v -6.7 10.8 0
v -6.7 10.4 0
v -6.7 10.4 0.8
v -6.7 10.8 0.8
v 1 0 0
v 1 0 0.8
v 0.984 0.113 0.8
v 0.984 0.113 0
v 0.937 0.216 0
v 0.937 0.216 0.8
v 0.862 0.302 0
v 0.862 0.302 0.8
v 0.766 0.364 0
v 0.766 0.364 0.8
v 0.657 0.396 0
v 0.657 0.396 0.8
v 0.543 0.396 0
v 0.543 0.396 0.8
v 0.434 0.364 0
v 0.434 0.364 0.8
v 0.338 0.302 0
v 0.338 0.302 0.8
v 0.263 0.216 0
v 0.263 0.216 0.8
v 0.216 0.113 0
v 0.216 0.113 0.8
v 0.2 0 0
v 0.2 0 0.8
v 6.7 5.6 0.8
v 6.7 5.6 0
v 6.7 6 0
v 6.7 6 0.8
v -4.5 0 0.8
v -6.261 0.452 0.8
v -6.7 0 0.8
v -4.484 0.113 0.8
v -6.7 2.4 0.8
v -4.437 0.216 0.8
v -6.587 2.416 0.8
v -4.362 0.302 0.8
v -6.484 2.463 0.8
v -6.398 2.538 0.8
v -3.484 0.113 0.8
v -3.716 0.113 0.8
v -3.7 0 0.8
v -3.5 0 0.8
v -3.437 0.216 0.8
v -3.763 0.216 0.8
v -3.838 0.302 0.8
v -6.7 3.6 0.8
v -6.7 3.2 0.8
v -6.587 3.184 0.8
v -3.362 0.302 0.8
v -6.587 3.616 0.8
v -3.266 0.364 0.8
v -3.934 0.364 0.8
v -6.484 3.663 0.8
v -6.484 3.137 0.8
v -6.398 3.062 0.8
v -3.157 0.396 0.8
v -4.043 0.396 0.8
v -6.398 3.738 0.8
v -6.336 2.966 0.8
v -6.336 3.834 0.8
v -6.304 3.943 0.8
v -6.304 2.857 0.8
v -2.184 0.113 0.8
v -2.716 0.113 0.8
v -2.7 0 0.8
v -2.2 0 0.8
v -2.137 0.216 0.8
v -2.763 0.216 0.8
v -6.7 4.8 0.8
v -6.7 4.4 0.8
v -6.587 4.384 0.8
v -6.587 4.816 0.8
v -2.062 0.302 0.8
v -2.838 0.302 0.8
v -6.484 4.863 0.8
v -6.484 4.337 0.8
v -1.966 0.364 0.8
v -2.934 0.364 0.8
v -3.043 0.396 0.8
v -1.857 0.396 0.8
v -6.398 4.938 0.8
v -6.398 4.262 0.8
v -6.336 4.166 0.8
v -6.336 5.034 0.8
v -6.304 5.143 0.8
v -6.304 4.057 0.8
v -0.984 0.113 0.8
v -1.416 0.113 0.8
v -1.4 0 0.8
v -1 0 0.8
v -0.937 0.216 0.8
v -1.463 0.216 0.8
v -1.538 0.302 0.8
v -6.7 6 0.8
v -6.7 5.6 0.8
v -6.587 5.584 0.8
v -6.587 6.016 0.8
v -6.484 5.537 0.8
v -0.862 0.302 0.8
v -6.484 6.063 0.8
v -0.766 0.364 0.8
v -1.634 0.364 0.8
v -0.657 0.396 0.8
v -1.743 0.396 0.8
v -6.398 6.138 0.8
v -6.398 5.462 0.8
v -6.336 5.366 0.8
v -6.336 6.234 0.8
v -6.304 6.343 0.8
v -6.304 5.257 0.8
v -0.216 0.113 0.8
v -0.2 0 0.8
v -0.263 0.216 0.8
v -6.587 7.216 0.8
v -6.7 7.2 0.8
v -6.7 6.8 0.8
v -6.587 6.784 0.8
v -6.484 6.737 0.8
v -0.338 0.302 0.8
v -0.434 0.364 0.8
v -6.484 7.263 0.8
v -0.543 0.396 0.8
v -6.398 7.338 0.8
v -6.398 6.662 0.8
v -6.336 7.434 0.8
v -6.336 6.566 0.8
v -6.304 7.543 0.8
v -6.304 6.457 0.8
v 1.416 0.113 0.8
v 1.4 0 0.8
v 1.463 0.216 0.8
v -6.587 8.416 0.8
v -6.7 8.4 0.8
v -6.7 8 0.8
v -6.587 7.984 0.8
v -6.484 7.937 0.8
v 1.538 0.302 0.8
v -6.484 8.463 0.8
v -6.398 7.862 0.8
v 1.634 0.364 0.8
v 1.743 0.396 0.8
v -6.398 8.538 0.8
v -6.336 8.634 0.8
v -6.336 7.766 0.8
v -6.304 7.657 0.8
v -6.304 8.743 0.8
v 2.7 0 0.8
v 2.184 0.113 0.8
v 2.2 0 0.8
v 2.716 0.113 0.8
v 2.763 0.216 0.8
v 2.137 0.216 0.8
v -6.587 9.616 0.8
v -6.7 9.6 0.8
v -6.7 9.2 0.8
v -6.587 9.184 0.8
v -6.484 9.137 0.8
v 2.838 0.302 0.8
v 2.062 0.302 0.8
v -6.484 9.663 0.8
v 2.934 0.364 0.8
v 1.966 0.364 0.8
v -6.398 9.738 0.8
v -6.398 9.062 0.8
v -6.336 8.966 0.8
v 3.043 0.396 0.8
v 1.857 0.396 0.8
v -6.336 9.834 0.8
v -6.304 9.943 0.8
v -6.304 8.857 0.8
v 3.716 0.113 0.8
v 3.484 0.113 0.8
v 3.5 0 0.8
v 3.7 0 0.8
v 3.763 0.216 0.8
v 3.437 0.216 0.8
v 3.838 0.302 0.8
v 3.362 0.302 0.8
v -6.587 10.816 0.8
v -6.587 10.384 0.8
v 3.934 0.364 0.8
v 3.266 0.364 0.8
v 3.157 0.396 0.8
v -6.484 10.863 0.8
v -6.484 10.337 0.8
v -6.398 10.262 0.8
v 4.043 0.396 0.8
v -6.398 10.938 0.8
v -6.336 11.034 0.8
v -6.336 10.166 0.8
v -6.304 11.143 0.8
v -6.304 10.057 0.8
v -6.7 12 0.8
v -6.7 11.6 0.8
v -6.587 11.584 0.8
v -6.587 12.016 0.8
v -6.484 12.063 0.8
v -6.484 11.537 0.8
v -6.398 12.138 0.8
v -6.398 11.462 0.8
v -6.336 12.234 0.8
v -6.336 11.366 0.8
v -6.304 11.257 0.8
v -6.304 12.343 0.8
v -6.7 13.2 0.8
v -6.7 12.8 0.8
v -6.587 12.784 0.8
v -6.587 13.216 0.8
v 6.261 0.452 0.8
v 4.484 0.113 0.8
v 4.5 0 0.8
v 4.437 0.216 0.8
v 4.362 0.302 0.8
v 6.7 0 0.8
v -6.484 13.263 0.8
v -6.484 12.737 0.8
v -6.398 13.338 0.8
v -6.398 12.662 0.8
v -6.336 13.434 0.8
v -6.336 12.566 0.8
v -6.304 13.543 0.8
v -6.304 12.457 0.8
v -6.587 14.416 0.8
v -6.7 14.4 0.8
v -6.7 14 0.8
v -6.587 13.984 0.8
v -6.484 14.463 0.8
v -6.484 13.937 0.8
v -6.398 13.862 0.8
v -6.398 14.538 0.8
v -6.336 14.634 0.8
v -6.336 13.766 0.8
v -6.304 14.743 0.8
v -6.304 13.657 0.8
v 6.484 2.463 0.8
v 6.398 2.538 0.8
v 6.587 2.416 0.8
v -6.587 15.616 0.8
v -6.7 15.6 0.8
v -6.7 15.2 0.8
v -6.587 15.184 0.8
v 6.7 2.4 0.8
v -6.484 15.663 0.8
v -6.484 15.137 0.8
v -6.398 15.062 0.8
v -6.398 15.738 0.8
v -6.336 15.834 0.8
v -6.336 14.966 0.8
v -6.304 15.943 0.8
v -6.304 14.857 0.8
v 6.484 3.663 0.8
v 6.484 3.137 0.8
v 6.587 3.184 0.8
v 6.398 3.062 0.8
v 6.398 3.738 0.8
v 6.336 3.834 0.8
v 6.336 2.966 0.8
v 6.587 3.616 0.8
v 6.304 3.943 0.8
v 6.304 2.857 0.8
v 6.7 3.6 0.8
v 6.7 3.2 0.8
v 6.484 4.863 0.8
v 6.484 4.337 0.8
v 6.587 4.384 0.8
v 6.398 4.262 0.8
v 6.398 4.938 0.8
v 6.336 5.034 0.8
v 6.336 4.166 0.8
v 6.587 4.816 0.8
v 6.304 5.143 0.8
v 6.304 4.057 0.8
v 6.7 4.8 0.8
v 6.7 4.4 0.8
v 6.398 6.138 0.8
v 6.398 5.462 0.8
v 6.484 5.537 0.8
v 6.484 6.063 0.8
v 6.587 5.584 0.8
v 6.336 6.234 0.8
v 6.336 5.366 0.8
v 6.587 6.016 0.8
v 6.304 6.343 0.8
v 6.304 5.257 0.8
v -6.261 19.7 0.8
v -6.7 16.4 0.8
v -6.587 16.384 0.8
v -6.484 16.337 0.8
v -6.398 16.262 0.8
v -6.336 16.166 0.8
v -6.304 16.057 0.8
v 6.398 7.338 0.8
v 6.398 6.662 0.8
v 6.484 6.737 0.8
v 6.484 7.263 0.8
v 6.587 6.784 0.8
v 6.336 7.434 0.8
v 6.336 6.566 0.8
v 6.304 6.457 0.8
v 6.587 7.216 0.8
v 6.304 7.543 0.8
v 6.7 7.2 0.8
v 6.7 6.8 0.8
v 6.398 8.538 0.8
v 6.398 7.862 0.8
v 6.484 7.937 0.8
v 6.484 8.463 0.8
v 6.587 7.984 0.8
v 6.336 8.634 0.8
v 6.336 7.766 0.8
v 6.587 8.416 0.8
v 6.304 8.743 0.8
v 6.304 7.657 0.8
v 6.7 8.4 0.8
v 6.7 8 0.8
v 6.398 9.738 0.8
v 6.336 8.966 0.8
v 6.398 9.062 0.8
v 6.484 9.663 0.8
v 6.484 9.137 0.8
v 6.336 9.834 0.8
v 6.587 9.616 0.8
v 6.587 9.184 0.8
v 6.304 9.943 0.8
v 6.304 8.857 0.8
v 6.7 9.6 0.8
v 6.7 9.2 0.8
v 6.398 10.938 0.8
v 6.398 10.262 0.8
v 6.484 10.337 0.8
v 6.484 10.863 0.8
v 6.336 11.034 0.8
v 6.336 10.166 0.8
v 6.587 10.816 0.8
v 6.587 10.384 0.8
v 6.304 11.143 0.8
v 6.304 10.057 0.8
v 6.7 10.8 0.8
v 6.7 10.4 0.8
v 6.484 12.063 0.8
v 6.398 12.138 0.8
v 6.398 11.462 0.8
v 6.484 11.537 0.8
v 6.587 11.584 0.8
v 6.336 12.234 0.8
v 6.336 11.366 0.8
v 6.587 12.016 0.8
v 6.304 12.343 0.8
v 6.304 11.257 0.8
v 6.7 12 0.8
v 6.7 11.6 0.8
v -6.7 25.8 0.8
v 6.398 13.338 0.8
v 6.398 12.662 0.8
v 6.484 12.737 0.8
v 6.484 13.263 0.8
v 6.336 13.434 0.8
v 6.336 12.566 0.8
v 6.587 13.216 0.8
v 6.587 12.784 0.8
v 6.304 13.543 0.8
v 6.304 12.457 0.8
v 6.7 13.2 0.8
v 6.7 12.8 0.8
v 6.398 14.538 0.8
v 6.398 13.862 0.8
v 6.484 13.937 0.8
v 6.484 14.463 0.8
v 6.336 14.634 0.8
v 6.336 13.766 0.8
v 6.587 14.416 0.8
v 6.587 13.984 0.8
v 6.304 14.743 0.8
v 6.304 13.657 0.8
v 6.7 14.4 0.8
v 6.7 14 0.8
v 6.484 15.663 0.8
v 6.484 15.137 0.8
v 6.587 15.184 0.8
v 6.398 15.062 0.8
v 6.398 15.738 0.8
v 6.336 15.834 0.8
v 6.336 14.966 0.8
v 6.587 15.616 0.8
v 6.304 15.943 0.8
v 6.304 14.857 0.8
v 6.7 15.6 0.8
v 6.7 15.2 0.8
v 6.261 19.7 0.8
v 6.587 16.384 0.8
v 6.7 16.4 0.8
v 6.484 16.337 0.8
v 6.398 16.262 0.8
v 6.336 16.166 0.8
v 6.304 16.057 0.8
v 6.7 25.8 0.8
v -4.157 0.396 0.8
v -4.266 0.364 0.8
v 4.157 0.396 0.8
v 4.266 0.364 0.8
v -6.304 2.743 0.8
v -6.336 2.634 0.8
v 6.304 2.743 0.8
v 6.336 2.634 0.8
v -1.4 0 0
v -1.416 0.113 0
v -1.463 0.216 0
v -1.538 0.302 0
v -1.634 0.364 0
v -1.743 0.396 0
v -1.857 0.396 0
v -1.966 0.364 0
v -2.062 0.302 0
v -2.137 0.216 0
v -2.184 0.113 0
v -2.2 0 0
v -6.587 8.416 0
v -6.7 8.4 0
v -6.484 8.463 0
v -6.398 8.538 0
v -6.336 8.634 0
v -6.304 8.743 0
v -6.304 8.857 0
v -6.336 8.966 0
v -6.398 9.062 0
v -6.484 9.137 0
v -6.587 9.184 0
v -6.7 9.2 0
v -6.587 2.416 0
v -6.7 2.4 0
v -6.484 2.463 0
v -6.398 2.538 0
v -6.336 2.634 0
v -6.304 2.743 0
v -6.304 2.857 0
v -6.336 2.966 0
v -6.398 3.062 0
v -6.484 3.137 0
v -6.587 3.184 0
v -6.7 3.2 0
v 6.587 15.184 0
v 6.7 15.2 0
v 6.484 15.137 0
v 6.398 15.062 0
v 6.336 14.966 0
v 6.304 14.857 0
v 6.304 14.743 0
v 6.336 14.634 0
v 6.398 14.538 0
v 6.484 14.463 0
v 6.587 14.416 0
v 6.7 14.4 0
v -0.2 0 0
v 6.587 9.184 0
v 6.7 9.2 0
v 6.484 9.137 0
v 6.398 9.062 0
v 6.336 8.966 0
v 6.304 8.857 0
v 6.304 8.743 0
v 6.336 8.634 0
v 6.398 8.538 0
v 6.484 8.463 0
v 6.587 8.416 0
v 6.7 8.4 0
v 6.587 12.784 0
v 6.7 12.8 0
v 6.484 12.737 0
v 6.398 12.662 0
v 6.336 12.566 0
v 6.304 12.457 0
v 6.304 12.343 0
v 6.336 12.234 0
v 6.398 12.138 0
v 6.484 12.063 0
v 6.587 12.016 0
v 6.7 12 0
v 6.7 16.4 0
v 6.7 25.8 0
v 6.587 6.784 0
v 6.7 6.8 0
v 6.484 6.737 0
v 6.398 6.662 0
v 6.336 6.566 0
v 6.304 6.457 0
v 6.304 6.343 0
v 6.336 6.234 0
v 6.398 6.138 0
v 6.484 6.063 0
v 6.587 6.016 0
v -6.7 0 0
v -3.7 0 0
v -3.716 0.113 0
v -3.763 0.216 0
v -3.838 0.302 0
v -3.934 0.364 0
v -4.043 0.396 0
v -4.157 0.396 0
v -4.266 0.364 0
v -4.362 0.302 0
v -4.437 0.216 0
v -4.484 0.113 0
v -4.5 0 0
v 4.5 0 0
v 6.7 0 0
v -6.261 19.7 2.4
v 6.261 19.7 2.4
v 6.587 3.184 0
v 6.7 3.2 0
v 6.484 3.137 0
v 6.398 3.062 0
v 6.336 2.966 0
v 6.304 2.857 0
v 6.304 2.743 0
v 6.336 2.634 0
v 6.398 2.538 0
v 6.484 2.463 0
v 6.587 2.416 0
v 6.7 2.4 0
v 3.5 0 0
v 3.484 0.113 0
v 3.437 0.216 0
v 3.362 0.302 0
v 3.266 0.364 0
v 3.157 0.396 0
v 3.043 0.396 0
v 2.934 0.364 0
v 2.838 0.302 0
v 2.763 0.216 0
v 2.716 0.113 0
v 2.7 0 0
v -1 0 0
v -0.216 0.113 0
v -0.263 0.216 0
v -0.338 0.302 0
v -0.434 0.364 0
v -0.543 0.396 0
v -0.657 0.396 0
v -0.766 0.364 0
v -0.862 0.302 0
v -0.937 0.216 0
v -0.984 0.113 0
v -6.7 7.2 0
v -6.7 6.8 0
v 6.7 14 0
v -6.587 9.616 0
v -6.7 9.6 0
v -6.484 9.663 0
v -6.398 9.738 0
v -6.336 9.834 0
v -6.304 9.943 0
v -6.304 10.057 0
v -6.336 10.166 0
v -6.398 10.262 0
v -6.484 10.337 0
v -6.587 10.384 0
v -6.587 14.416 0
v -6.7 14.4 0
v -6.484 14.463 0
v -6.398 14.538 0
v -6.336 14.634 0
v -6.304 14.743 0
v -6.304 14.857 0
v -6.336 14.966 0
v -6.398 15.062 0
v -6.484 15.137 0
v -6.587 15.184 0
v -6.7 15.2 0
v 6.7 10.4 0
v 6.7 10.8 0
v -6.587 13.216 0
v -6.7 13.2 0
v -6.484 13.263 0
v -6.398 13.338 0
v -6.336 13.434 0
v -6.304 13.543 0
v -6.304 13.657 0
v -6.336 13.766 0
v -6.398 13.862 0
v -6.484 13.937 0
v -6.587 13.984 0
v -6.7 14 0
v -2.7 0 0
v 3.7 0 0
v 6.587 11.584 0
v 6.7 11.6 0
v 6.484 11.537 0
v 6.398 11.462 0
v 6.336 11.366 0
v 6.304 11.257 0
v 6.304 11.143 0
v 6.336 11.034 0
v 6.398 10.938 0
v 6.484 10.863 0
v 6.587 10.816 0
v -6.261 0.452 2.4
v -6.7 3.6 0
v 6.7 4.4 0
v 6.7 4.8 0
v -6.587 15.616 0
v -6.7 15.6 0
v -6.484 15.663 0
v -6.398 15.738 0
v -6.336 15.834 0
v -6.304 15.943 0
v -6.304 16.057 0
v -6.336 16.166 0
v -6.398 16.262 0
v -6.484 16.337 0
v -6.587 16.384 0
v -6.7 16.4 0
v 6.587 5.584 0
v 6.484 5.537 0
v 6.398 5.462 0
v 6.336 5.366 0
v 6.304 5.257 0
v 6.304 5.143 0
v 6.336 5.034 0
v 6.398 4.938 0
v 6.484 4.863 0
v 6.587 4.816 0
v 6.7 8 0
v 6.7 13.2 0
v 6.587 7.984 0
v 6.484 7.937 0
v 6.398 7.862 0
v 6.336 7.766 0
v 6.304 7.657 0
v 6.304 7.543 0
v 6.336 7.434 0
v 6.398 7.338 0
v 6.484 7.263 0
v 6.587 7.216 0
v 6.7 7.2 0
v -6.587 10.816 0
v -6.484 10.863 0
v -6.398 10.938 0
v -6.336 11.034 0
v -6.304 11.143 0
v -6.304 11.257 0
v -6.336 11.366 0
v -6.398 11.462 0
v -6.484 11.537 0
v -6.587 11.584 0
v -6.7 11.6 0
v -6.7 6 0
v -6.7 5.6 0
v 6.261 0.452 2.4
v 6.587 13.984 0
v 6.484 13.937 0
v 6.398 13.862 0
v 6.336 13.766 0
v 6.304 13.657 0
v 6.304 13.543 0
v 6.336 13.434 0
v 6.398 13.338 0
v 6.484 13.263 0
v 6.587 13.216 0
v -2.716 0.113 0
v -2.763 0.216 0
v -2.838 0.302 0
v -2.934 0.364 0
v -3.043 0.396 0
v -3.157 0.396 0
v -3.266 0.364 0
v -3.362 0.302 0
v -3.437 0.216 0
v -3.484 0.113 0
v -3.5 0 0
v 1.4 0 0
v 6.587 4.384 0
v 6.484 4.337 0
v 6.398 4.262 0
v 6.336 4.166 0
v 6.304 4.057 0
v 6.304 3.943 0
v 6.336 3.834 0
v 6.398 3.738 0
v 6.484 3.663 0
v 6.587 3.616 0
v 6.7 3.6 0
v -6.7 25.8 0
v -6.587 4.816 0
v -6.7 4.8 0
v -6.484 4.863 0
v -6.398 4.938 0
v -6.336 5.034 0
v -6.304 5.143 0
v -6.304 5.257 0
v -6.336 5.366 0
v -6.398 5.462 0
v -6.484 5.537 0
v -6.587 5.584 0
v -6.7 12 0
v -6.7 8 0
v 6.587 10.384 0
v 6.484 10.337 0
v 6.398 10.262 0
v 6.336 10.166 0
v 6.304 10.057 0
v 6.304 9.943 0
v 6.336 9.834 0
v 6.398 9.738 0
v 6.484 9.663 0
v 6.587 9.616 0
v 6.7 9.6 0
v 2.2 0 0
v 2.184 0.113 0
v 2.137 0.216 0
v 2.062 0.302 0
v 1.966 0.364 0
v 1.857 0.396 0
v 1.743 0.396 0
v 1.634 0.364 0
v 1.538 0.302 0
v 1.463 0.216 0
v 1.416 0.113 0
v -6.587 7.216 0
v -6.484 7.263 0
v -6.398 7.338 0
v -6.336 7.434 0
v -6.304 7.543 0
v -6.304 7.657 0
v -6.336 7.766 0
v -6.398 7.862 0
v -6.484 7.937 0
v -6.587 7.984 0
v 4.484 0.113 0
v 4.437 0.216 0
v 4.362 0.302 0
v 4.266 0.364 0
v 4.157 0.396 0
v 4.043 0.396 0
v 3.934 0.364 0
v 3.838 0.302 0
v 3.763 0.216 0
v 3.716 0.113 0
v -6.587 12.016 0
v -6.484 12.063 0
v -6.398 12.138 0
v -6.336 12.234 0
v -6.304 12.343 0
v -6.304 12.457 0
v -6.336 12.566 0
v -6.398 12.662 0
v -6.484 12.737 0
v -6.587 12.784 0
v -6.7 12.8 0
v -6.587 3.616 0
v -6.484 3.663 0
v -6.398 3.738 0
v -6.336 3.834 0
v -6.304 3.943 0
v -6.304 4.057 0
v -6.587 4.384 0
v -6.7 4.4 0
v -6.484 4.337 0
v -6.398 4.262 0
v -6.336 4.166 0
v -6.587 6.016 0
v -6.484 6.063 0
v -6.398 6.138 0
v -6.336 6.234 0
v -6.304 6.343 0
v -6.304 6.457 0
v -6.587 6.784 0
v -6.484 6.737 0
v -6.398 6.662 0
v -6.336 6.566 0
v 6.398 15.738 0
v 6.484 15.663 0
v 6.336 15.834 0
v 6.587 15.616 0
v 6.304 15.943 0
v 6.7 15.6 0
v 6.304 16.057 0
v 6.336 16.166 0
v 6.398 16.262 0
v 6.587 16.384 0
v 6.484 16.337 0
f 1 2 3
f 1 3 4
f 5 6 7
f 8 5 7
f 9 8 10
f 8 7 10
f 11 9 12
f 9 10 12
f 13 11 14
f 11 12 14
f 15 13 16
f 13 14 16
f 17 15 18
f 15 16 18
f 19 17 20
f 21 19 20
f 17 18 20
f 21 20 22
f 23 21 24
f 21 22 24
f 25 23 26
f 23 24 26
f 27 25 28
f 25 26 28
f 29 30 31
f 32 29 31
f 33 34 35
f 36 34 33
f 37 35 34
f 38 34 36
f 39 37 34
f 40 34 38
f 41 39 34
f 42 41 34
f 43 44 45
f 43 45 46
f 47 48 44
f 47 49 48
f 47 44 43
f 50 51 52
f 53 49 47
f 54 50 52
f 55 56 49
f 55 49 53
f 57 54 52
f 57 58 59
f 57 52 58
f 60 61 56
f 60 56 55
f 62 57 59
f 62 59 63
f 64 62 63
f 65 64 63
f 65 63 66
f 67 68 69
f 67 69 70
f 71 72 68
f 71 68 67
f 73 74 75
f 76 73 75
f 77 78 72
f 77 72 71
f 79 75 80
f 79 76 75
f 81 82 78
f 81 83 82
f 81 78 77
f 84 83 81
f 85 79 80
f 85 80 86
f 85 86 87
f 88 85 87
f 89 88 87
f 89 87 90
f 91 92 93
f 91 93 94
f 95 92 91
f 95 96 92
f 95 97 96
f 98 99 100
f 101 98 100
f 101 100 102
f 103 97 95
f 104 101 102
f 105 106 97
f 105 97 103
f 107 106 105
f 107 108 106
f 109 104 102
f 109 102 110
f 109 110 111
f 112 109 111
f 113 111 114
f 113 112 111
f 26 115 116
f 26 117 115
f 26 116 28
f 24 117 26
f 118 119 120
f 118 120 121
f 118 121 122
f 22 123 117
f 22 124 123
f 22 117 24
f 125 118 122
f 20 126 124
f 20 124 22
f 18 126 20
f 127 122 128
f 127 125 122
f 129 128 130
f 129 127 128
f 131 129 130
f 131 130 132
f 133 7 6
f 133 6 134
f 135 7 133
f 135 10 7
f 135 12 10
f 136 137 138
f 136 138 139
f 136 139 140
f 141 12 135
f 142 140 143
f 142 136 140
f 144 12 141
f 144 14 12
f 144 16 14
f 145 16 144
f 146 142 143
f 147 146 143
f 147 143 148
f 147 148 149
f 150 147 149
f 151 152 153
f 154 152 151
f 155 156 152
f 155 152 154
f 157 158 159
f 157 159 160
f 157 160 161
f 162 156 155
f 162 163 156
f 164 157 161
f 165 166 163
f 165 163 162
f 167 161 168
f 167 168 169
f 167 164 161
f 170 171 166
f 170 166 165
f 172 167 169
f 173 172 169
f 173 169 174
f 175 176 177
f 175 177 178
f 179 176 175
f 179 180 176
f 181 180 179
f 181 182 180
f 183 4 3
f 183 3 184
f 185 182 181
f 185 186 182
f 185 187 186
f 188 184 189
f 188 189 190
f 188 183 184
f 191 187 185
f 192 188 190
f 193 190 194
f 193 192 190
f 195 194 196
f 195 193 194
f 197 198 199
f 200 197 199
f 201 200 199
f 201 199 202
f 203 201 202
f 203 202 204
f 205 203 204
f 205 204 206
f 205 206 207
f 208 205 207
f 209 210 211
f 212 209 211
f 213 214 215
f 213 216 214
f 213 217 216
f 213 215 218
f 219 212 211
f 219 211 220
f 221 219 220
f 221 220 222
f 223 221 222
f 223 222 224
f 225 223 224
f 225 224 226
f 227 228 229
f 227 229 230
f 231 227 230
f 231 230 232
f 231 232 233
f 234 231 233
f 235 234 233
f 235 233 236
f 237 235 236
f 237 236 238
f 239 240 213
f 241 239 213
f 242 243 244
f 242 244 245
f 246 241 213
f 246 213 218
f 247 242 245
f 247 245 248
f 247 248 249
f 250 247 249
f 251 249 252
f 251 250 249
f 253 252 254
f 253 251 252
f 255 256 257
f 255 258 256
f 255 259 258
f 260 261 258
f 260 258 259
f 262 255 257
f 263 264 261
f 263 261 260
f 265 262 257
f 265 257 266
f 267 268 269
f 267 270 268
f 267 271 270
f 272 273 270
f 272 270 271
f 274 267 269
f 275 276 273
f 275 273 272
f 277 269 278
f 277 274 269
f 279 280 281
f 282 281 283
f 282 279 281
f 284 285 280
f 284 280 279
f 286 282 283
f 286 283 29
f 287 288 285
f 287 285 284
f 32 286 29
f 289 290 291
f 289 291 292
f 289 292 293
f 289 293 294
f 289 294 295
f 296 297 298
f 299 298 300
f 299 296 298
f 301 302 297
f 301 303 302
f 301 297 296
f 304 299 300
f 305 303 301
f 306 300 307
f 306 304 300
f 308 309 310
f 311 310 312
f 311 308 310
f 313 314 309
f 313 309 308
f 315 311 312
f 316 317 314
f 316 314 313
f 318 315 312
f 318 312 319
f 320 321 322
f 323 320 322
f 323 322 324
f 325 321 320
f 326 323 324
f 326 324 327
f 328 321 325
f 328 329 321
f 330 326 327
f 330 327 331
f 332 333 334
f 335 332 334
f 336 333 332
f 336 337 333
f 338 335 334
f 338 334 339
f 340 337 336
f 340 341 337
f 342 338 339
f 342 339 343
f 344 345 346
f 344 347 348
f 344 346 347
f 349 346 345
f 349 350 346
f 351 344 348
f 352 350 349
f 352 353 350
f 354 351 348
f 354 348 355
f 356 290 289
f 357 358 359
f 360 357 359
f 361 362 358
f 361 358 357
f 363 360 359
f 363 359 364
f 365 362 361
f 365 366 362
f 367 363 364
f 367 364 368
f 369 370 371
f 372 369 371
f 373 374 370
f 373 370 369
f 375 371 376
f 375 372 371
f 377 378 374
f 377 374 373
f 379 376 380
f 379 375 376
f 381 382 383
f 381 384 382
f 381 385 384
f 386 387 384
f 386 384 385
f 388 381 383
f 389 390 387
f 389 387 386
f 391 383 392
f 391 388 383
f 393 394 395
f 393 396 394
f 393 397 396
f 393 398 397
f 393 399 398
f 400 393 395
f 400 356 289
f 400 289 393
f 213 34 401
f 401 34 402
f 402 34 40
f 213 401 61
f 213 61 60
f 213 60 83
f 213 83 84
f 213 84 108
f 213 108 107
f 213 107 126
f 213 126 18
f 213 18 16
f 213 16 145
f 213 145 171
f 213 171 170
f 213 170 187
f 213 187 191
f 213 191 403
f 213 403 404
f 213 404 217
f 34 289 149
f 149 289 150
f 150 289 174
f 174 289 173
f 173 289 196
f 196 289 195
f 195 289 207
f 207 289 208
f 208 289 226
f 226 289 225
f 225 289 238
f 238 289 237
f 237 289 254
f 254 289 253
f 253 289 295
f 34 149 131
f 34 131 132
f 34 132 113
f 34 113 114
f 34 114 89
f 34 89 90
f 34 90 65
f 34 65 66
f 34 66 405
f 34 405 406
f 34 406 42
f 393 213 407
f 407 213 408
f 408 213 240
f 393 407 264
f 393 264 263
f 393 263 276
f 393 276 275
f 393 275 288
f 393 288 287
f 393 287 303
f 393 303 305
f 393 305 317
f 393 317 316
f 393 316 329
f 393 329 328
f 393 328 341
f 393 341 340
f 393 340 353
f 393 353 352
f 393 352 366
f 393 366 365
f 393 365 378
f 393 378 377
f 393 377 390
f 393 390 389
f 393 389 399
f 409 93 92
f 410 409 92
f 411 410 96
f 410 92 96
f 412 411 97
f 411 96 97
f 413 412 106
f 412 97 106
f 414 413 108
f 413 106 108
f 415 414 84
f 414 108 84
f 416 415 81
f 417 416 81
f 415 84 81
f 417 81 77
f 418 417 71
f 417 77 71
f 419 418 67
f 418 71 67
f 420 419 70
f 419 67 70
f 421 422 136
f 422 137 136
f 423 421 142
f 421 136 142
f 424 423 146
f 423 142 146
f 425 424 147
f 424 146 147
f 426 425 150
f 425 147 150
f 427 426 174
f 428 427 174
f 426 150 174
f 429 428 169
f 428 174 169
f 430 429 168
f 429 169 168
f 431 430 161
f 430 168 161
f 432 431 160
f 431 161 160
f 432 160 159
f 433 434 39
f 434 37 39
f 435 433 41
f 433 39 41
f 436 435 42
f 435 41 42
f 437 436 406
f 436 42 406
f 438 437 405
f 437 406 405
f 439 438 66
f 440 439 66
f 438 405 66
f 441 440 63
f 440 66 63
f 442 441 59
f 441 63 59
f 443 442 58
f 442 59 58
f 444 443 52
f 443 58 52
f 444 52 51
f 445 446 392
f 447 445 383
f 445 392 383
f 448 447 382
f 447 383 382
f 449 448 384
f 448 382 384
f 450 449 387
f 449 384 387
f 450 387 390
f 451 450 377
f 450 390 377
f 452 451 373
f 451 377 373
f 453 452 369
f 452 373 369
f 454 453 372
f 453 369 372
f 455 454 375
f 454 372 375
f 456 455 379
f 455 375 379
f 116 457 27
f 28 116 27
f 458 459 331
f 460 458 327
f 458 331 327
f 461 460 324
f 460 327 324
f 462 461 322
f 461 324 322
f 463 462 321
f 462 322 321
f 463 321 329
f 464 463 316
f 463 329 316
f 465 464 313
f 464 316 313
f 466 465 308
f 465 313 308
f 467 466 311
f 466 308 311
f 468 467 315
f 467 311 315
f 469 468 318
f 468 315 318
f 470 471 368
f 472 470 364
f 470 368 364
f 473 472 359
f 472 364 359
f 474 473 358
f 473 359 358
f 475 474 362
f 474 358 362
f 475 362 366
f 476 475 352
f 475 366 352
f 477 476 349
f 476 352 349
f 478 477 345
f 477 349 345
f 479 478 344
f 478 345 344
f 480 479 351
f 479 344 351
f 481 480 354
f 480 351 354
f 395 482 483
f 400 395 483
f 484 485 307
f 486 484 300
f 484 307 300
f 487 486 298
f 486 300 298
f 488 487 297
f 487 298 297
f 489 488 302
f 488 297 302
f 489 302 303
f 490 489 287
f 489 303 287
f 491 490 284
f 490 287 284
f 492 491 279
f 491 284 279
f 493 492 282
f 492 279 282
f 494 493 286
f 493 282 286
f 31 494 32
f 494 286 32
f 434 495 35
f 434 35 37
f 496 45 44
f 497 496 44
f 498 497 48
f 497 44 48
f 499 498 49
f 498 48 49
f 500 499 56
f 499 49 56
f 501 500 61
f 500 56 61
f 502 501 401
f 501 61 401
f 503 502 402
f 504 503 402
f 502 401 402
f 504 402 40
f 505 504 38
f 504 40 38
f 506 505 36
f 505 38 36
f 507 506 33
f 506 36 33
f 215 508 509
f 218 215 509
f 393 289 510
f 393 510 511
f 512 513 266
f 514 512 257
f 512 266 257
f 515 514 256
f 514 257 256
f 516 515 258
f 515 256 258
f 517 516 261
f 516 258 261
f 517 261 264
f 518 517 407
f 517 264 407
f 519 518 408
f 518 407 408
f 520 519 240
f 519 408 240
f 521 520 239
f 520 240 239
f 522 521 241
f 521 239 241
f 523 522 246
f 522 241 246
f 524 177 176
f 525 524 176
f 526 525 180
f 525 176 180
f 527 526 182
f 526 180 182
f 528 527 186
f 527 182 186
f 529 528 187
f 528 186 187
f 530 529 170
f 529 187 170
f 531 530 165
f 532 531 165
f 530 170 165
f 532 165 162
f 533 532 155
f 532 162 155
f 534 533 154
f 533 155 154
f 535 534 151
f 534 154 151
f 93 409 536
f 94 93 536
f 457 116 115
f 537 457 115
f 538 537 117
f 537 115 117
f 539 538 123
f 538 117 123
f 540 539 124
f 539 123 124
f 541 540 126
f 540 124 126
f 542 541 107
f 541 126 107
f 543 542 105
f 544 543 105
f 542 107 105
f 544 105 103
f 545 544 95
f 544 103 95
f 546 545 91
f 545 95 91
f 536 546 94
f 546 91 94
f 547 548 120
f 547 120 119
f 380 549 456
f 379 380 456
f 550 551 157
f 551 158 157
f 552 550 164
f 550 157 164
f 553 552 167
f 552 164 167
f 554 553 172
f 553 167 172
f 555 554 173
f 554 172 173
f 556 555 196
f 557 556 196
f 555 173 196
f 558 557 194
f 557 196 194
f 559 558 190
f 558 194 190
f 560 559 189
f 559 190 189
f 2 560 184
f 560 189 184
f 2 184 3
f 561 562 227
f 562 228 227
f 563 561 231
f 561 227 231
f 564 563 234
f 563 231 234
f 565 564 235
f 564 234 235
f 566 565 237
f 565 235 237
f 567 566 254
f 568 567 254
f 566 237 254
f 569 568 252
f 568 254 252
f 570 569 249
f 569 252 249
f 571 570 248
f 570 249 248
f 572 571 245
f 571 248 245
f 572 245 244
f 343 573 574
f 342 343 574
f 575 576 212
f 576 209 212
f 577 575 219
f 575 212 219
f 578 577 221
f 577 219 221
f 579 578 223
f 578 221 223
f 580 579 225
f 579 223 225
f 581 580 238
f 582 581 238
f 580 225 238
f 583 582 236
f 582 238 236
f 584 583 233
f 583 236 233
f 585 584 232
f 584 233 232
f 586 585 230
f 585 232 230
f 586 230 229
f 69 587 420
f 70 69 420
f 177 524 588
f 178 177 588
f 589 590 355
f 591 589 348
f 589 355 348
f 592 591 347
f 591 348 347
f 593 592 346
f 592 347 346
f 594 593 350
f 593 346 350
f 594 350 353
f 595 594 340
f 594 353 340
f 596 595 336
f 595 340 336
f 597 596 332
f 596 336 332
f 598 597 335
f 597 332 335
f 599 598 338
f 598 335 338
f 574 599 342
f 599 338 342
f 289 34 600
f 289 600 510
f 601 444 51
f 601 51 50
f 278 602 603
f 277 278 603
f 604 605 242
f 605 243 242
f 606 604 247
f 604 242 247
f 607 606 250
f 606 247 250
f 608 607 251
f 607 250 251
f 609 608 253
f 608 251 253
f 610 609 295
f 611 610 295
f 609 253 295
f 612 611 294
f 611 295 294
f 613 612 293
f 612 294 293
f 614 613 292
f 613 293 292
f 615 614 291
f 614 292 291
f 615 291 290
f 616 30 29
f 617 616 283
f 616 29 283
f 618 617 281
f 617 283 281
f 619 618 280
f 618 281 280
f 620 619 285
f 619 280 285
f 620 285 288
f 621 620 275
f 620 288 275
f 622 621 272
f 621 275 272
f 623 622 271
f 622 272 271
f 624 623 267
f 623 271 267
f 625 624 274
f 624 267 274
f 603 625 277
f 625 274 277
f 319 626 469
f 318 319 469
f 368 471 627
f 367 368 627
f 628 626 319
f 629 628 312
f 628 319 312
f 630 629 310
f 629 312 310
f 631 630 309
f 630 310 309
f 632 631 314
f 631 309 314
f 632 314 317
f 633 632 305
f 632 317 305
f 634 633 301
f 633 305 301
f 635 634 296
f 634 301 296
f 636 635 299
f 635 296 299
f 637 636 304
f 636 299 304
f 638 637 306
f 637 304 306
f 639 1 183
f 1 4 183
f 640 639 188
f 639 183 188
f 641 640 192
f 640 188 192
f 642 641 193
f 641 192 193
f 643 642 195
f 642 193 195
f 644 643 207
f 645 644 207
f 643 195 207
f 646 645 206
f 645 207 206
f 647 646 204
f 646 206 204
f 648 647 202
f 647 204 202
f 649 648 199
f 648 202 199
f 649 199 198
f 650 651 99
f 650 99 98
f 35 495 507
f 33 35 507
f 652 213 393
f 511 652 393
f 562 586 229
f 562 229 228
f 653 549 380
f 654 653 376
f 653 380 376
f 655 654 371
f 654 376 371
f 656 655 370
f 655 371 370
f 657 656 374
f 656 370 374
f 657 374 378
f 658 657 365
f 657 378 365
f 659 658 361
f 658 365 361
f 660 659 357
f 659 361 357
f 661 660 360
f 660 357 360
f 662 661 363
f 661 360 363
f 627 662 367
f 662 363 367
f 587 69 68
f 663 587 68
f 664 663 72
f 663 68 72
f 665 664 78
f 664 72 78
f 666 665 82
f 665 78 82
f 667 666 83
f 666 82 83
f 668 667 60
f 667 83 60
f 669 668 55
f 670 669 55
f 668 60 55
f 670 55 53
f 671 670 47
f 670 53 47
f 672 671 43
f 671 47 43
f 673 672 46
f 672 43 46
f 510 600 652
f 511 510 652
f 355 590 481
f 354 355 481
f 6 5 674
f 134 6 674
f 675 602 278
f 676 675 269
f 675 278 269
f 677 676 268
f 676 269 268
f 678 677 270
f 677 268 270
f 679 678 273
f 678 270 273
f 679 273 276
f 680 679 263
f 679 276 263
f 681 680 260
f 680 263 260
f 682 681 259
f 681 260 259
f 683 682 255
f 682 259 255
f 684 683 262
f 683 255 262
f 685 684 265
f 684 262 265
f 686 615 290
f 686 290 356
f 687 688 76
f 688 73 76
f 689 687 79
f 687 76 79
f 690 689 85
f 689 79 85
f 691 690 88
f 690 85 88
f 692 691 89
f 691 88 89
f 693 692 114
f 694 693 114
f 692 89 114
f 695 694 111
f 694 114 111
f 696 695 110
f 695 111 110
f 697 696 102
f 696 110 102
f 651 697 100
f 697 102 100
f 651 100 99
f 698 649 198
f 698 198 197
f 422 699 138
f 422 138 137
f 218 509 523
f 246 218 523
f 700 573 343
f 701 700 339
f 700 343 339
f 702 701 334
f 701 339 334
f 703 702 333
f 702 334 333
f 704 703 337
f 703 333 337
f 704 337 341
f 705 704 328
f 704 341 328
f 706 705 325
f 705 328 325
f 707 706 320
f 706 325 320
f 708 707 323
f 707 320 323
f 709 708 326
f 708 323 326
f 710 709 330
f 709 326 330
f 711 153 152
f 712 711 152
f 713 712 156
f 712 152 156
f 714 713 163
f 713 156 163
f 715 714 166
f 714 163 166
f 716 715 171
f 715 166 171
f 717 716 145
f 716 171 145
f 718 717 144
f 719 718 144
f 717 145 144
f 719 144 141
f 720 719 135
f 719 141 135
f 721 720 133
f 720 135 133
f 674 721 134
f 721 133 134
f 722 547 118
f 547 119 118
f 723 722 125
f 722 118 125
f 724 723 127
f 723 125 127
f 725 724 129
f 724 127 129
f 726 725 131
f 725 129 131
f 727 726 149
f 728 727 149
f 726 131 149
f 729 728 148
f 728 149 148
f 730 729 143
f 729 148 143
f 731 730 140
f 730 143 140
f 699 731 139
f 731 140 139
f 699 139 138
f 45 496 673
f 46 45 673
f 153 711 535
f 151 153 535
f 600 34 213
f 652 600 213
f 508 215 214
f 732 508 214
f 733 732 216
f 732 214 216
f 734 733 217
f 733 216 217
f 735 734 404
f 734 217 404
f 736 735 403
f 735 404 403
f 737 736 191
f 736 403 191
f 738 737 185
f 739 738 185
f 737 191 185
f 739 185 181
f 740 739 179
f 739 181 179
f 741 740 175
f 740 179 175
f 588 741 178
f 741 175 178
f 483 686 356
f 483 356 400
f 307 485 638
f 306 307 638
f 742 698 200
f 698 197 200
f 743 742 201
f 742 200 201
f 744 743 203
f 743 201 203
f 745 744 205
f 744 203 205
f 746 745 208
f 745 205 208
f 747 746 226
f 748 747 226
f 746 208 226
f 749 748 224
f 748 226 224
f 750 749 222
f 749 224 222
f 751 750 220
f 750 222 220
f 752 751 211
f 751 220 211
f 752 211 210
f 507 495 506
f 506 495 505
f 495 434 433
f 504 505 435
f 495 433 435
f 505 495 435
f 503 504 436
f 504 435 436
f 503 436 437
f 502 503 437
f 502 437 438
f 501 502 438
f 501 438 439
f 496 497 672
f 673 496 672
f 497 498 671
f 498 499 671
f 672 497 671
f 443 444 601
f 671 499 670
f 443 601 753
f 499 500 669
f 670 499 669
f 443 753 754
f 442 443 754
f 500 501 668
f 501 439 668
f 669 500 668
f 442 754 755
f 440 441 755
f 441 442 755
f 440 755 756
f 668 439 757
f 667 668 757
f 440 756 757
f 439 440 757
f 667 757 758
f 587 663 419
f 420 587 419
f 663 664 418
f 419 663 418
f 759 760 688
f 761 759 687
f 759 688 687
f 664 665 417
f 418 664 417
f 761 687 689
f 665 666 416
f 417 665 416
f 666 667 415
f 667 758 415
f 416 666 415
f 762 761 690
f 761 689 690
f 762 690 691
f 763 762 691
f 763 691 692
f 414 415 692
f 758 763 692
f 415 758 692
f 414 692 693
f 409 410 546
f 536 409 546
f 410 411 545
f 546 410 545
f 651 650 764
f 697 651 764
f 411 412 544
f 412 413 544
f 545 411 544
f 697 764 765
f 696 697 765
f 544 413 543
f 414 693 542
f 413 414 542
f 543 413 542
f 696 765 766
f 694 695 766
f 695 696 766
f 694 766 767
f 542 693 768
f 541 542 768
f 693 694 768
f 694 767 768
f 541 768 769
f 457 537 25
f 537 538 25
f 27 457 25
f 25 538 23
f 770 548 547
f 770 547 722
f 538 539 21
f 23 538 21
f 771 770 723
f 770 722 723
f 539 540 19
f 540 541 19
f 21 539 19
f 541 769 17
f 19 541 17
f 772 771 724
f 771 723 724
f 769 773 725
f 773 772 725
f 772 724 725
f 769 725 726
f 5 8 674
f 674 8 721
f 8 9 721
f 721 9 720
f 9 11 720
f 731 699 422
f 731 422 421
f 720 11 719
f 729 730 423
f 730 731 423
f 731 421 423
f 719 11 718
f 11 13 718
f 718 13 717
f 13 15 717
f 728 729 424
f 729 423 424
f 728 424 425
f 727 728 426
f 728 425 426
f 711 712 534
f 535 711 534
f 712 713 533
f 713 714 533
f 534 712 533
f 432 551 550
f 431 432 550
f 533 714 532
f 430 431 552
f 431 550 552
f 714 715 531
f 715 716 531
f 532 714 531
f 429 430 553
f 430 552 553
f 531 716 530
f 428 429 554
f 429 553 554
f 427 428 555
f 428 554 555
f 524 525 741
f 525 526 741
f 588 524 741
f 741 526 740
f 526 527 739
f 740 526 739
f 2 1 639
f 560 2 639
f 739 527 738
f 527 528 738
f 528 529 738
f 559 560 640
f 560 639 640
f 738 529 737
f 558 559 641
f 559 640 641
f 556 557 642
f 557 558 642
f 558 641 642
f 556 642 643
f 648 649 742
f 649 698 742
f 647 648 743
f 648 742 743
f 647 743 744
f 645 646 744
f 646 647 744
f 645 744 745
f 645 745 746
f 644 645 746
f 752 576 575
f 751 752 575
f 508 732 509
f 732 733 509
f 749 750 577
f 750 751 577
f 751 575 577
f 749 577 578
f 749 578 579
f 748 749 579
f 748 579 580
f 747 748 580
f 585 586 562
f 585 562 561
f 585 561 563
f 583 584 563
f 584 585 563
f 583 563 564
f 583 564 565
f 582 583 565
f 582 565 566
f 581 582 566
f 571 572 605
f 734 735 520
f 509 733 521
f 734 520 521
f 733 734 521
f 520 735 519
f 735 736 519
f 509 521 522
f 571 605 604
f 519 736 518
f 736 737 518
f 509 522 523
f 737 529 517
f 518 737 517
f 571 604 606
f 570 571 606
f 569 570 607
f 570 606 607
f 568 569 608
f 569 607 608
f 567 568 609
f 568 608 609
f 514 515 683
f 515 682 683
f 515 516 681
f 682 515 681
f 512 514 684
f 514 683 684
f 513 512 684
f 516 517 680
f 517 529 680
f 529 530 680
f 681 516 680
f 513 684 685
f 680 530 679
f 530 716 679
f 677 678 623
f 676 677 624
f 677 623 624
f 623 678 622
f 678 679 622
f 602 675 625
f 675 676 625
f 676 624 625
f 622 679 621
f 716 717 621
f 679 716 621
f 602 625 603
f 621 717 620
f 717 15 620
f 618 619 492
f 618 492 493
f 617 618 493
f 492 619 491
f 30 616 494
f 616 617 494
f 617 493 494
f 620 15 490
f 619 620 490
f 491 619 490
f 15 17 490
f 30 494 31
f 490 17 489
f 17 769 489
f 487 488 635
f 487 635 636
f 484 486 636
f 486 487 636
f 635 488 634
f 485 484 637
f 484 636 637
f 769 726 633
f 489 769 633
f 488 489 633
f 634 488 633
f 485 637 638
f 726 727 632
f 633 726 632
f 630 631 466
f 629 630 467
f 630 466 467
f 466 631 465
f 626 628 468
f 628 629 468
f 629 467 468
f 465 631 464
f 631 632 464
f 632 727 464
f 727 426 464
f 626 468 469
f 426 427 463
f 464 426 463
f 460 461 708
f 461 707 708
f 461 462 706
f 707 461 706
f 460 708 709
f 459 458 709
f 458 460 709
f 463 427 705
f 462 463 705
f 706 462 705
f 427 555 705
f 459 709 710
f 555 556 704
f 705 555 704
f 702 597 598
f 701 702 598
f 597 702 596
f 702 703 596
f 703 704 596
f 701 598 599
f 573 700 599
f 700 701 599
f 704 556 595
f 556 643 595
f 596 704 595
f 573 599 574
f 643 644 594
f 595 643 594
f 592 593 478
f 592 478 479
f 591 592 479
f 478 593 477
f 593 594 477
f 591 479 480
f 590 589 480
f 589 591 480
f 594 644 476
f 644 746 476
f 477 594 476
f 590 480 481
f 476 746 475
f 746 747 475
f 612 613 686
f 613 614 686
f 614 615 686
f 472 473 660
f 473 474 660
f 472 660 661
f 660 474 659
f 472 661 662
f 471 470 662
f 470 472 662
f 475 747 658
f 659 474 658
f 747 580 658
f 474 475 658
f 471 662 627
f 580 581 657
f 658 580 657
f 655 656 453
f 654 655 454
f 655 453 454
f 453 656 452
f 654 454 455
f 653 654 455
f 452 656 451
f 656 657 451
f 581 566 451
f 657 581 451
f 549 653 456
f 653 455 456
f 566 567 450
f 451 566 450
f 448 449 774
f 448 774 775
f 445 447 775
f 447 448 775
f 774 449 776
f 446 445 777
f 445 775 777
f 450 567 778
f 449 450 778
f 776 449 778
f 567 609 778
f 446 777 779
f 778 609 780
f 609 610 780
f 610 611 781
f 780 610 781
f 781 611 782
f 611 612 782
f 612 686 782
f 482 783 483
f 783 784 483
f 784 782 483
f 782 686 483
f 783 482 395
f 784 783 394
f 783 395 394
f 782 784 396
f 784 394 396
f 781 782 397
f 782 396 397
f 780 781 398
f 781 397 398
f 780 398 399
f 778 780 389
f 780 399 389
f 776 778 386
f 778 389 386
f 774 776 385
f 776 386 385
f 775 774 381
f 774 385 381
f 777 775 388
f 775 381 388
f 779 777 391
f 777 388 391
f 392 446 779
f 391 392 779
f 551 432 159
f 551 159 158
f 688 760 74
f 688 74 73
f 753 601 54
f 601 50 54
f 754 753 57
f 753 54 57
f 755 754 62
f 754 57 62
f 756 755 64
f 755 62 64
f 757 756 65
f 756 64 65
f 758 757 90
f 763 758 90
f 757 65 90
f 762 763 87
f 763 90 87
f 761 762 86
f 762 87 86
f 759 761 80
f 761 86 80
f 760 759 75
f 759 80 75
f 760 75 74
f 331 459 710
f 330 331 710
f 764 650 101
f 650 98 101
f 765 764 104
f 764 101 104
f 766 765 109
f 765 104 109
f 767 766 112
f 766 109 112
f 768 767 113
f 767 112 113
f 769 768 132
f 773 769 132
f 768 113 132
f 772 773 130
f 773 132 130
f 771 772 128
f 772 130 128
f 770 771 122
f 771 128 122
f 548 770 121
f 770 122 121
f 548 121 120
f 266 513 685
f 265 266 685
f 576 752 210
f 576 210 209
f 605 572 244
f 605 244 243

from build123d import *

# Parameters (mm, degrees)
F0_W     = 13.4
F0_H     = 25.8
F1_DEPTH = 0.8
F2_R     = 0.4
F3_DEPTH = 25
F4_W     = 12.522456
F4_H     = 19.248359
F5_DEPTH = 1.6


with BuildPart() as f1:
    # F0 (on Top) → F1 (new body)
    with BuildSketch(Plane.XY):
        with Locations((0, 12.9)):
            Rectangle(F0_W, F0_H)
    extrude(amount=F1_DEPTH)

    # F2 (on face) → F3 (cut)
    with BuildSketch(Plane.XY.offset(0.8)):
        with Locations((-6.7, 2.8)):
            Circle(F2_R)
        with Locations((-6.7, 4)):
            Circle(F2_R)
        with Locations((-6.7, 5.2)):
            Circle(F2_R)
        with Locations((-6.7, 6.4)):
            Circle(F2_R)
        with Locations((-6.7, 7.6)):
            Circle(F2_R)
        with Locations((-6.7, 8.8)):
            Circle(F2_R)
        with Locations((-6.7, 10)):
            Circle(F2_R)
        with Locations((-6.7, 11.2)):
            Circle(F2_R)
        with Locations((-6.7, 12.4)):
            Circle(F2_R)
        with Locations((-6.7, 13.6)):
            Circle(F2_R)
        with Locations((-6.7, 14.8)):
            Circle(F2_R)
        with Locations((-6.7, 16)):
            Circle(F2_R)
        with Locations((6.7, 2.8)):
            Circle(F2_R)
        with Locations((6.7, 4)):
            Circle(F2_R)
        with Locations((6.7, 5.2)):
            Circle(F2_R)
        with Locations((6.7, 6.4)):
            Circle(F2_R)
        with Locations((6.7, 7.6)):
            Circle(F2_R)
        with Locations((6.7, 8.8)):
            Circle(F2_R)
        with Locations((6.7, 10)):
            Circle(F2_R)
        with Locations((6.7, 11.2)):
            Circle(F2_R)
        with Locations((6.7, 12.4)):
            Circle(F2_R)
        with Locations((6.7, 13.6)):
            Circle(F2_R)
        with Locations((6.7, 14.8)):
            Circle(F2_R)
        with Locations((6.7, 16)):
            Circle(F2_R)
        with Locations((-4.1, 0)):
            Circle(F2_R)
        with Locations((-3.1, 0)):
            Circle(F2_R)
        with Locations((-1.8, 0)):
            Circle(F2_R)
        with Locations((-0.6, 0)):
            Circle(F2_R)
        with Locations((0.6, 0)):
            Circle(F2_R)
        with Locations((1.8, 0)):
            Circle(F2_R)
        with Locations((3.1, 0)):
            Circle(F2_R)
        with Locations((4.1, 0)):
            Circle(F2_R)
    extrude(amount=-F3_DEPTH, mode=Mode.SUBTRACT)

    # F4 (on face) → F5 (join)
    with BuildSketch(Plane.XY.offset(0.8)):
        with Locations((0, 10.07582)):
            Rectangle(F4_W, F4_H)
    extrude(amount=F5_DEPTH)


solid = f1.part
